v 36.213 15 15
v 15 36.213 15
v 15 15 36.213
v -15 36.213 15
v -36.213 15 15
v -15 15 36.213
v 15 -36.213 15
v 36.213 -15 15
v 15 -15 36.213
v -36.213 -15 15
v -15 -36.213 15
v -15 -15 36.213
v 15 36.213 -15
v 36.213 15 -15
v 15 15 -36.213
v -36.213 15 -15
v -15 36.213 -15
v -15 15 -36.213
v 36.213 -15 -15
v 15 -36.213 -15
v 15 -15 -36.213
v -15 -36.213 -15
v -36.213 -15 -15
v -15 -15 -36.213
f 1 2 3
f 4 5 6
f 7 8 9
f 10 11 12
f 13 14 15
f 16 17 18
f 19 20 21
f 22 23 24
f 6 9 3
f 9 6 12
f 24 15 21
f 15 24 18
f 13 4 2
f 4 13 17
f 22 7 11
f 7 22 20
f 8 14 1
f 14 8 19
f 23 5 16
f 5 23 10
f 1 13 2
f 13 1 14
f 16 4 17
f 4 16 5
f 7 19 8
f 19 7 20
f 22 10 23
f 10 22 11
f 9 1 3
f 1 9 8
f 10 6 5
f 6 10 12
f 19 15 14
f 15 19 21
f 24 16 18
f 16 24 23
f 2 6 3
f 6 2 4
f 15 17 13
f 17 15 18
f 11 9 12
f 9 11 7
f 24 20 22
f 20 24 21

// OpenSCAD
// Rhombicuboctahedron
// (C) @oblomobka - 2023.06
// GPL license

/* **CUSTOMIZER VARIABLES** */
// Edge
edge = 30; // [10:100]
// Center of the solid or stand over a face
position = "Center"; // ["Center", "Face"]

/* **MODULES** */   
module Rhombicuboctahedron ( edge = 30, position = "Face"){ //eC / aaC / aaaT -> Conway notation
    
    // Invariants
    
    // Relations
    
    // Variables
    a = (edge+2*edge/sqrt(2))/2;
    b = edge/sqrt(2); //b represent the truncation value to obtain regular polygons. It operates on the vertex of the original(Platonic) polyhedron.
    
    // Definition of points and faces V = 24 / F = 26 ( 8 triangles + 18 squares )
    eCpoints = [
        // Every line define a triangle face in one octant
        [ +(a-b), +(a-b), +a], [ +(a-b), +a, +(a-b)], [ +a, +(a-b), +(a-b)],    // +X+Y+Z [  0,  1,  2]
        [ -(a-b), +(a-b), +a], [ -(a-b), +a, +(a-b)], [ -a, +(a-b), +(a-b)],    // -X+Y+Z [  3,  4,  5]
        [ +(a-b), -(a-b), +a], [ +(a-b), -a, +(a-b)], [ +a, -(a-b), +(a-b)],    // +X-Y+Z [  6,  7,  8]
        [ -(a-b), -(a-b), +a], [ -(a-b), -a, +(a-b)], [ -a, -(a-b), +(a-b)],    // -X-Y+Z [  9, 10, 11]
    
        [ +(a-b), +(a-b), -a], [ +(a-b), +a, -(a-b)], [ +a, +(a-b), -(a-b)],    // +X+Y-Z [ 12, 13, 14]
        [ -(a-b), +(a-b), -a], [ -(a-b), +a, -(a-b)], [ -a, +(a-b), -(a-b)],    // -X+Y-Z [ 15, 16, 17]
        [ +(a-b), -(a-b), -a], [ +(a-b), -a, -(a-b)], [ +a, -(a-b), -(a-b)],    // +X-Y-Z [ 18, 19, 20]
        [ -(a-b), -(a-b), -a], [ -(a-b), -a, -(a-b)], [ -a, -(a-b), -(a-b)],    // -X-Y-Z [ 21, 22, 23]
        ];
        
    eCfaces = [
        // Build 8 triangles. One triangle per octant
        [  0,  1,  2], [  3,  5,  4], [  6,  8,  7], [  9, 10, 11],     // UP
        [ 12, 14, 13], [ 15, 16, 17], [ 18, 19, 20], [ 21, 23, 22],     // DOWN
        
        // Squares
        [  0,  6,  9,  3], [ 12, 15, 21, 18],                                           // parallel XY
        [  1,  4, 16, 13], [  7, 19, 22, 10],                                           // parallel XZ
        [  2, 14, 20,  8], [  5, 11, 23, 17],                                           // parallel YZ        
        [  1, 13, 14,  2], [  4,  5, 17, 16], [  7,  8, 20, 19], [ 10, 22, 23, 11],     // bevel XY
        [  0,  2,  8,  6], [  3,  9, 11,  5], [ 12, 18, 20, 14], [ 15, 17, 23, 21],     // bevel XZ
        [  0,  3,  4,  1], [ 12, 13, 16, 15], [  6,  7, 10,  9], [ 18, 21, 22, 19]      // bevel YZ
        ];
  
    // Polyhedron stands on xy plane centered on the center of the face or centered on the center of polyhedron
    if ( position == "Center") {
            polyhedron ( eCpoints, eCfaces);}
        
    else if ( position == "Face"){
        translate([ 0, 0, a])
            polyhedron ( eCpoints, eCfaces);}
    }
        
/* **RENDERING OF SOLIDS** */
Rhombicuboctahedron ( edge = edge, position = position);
